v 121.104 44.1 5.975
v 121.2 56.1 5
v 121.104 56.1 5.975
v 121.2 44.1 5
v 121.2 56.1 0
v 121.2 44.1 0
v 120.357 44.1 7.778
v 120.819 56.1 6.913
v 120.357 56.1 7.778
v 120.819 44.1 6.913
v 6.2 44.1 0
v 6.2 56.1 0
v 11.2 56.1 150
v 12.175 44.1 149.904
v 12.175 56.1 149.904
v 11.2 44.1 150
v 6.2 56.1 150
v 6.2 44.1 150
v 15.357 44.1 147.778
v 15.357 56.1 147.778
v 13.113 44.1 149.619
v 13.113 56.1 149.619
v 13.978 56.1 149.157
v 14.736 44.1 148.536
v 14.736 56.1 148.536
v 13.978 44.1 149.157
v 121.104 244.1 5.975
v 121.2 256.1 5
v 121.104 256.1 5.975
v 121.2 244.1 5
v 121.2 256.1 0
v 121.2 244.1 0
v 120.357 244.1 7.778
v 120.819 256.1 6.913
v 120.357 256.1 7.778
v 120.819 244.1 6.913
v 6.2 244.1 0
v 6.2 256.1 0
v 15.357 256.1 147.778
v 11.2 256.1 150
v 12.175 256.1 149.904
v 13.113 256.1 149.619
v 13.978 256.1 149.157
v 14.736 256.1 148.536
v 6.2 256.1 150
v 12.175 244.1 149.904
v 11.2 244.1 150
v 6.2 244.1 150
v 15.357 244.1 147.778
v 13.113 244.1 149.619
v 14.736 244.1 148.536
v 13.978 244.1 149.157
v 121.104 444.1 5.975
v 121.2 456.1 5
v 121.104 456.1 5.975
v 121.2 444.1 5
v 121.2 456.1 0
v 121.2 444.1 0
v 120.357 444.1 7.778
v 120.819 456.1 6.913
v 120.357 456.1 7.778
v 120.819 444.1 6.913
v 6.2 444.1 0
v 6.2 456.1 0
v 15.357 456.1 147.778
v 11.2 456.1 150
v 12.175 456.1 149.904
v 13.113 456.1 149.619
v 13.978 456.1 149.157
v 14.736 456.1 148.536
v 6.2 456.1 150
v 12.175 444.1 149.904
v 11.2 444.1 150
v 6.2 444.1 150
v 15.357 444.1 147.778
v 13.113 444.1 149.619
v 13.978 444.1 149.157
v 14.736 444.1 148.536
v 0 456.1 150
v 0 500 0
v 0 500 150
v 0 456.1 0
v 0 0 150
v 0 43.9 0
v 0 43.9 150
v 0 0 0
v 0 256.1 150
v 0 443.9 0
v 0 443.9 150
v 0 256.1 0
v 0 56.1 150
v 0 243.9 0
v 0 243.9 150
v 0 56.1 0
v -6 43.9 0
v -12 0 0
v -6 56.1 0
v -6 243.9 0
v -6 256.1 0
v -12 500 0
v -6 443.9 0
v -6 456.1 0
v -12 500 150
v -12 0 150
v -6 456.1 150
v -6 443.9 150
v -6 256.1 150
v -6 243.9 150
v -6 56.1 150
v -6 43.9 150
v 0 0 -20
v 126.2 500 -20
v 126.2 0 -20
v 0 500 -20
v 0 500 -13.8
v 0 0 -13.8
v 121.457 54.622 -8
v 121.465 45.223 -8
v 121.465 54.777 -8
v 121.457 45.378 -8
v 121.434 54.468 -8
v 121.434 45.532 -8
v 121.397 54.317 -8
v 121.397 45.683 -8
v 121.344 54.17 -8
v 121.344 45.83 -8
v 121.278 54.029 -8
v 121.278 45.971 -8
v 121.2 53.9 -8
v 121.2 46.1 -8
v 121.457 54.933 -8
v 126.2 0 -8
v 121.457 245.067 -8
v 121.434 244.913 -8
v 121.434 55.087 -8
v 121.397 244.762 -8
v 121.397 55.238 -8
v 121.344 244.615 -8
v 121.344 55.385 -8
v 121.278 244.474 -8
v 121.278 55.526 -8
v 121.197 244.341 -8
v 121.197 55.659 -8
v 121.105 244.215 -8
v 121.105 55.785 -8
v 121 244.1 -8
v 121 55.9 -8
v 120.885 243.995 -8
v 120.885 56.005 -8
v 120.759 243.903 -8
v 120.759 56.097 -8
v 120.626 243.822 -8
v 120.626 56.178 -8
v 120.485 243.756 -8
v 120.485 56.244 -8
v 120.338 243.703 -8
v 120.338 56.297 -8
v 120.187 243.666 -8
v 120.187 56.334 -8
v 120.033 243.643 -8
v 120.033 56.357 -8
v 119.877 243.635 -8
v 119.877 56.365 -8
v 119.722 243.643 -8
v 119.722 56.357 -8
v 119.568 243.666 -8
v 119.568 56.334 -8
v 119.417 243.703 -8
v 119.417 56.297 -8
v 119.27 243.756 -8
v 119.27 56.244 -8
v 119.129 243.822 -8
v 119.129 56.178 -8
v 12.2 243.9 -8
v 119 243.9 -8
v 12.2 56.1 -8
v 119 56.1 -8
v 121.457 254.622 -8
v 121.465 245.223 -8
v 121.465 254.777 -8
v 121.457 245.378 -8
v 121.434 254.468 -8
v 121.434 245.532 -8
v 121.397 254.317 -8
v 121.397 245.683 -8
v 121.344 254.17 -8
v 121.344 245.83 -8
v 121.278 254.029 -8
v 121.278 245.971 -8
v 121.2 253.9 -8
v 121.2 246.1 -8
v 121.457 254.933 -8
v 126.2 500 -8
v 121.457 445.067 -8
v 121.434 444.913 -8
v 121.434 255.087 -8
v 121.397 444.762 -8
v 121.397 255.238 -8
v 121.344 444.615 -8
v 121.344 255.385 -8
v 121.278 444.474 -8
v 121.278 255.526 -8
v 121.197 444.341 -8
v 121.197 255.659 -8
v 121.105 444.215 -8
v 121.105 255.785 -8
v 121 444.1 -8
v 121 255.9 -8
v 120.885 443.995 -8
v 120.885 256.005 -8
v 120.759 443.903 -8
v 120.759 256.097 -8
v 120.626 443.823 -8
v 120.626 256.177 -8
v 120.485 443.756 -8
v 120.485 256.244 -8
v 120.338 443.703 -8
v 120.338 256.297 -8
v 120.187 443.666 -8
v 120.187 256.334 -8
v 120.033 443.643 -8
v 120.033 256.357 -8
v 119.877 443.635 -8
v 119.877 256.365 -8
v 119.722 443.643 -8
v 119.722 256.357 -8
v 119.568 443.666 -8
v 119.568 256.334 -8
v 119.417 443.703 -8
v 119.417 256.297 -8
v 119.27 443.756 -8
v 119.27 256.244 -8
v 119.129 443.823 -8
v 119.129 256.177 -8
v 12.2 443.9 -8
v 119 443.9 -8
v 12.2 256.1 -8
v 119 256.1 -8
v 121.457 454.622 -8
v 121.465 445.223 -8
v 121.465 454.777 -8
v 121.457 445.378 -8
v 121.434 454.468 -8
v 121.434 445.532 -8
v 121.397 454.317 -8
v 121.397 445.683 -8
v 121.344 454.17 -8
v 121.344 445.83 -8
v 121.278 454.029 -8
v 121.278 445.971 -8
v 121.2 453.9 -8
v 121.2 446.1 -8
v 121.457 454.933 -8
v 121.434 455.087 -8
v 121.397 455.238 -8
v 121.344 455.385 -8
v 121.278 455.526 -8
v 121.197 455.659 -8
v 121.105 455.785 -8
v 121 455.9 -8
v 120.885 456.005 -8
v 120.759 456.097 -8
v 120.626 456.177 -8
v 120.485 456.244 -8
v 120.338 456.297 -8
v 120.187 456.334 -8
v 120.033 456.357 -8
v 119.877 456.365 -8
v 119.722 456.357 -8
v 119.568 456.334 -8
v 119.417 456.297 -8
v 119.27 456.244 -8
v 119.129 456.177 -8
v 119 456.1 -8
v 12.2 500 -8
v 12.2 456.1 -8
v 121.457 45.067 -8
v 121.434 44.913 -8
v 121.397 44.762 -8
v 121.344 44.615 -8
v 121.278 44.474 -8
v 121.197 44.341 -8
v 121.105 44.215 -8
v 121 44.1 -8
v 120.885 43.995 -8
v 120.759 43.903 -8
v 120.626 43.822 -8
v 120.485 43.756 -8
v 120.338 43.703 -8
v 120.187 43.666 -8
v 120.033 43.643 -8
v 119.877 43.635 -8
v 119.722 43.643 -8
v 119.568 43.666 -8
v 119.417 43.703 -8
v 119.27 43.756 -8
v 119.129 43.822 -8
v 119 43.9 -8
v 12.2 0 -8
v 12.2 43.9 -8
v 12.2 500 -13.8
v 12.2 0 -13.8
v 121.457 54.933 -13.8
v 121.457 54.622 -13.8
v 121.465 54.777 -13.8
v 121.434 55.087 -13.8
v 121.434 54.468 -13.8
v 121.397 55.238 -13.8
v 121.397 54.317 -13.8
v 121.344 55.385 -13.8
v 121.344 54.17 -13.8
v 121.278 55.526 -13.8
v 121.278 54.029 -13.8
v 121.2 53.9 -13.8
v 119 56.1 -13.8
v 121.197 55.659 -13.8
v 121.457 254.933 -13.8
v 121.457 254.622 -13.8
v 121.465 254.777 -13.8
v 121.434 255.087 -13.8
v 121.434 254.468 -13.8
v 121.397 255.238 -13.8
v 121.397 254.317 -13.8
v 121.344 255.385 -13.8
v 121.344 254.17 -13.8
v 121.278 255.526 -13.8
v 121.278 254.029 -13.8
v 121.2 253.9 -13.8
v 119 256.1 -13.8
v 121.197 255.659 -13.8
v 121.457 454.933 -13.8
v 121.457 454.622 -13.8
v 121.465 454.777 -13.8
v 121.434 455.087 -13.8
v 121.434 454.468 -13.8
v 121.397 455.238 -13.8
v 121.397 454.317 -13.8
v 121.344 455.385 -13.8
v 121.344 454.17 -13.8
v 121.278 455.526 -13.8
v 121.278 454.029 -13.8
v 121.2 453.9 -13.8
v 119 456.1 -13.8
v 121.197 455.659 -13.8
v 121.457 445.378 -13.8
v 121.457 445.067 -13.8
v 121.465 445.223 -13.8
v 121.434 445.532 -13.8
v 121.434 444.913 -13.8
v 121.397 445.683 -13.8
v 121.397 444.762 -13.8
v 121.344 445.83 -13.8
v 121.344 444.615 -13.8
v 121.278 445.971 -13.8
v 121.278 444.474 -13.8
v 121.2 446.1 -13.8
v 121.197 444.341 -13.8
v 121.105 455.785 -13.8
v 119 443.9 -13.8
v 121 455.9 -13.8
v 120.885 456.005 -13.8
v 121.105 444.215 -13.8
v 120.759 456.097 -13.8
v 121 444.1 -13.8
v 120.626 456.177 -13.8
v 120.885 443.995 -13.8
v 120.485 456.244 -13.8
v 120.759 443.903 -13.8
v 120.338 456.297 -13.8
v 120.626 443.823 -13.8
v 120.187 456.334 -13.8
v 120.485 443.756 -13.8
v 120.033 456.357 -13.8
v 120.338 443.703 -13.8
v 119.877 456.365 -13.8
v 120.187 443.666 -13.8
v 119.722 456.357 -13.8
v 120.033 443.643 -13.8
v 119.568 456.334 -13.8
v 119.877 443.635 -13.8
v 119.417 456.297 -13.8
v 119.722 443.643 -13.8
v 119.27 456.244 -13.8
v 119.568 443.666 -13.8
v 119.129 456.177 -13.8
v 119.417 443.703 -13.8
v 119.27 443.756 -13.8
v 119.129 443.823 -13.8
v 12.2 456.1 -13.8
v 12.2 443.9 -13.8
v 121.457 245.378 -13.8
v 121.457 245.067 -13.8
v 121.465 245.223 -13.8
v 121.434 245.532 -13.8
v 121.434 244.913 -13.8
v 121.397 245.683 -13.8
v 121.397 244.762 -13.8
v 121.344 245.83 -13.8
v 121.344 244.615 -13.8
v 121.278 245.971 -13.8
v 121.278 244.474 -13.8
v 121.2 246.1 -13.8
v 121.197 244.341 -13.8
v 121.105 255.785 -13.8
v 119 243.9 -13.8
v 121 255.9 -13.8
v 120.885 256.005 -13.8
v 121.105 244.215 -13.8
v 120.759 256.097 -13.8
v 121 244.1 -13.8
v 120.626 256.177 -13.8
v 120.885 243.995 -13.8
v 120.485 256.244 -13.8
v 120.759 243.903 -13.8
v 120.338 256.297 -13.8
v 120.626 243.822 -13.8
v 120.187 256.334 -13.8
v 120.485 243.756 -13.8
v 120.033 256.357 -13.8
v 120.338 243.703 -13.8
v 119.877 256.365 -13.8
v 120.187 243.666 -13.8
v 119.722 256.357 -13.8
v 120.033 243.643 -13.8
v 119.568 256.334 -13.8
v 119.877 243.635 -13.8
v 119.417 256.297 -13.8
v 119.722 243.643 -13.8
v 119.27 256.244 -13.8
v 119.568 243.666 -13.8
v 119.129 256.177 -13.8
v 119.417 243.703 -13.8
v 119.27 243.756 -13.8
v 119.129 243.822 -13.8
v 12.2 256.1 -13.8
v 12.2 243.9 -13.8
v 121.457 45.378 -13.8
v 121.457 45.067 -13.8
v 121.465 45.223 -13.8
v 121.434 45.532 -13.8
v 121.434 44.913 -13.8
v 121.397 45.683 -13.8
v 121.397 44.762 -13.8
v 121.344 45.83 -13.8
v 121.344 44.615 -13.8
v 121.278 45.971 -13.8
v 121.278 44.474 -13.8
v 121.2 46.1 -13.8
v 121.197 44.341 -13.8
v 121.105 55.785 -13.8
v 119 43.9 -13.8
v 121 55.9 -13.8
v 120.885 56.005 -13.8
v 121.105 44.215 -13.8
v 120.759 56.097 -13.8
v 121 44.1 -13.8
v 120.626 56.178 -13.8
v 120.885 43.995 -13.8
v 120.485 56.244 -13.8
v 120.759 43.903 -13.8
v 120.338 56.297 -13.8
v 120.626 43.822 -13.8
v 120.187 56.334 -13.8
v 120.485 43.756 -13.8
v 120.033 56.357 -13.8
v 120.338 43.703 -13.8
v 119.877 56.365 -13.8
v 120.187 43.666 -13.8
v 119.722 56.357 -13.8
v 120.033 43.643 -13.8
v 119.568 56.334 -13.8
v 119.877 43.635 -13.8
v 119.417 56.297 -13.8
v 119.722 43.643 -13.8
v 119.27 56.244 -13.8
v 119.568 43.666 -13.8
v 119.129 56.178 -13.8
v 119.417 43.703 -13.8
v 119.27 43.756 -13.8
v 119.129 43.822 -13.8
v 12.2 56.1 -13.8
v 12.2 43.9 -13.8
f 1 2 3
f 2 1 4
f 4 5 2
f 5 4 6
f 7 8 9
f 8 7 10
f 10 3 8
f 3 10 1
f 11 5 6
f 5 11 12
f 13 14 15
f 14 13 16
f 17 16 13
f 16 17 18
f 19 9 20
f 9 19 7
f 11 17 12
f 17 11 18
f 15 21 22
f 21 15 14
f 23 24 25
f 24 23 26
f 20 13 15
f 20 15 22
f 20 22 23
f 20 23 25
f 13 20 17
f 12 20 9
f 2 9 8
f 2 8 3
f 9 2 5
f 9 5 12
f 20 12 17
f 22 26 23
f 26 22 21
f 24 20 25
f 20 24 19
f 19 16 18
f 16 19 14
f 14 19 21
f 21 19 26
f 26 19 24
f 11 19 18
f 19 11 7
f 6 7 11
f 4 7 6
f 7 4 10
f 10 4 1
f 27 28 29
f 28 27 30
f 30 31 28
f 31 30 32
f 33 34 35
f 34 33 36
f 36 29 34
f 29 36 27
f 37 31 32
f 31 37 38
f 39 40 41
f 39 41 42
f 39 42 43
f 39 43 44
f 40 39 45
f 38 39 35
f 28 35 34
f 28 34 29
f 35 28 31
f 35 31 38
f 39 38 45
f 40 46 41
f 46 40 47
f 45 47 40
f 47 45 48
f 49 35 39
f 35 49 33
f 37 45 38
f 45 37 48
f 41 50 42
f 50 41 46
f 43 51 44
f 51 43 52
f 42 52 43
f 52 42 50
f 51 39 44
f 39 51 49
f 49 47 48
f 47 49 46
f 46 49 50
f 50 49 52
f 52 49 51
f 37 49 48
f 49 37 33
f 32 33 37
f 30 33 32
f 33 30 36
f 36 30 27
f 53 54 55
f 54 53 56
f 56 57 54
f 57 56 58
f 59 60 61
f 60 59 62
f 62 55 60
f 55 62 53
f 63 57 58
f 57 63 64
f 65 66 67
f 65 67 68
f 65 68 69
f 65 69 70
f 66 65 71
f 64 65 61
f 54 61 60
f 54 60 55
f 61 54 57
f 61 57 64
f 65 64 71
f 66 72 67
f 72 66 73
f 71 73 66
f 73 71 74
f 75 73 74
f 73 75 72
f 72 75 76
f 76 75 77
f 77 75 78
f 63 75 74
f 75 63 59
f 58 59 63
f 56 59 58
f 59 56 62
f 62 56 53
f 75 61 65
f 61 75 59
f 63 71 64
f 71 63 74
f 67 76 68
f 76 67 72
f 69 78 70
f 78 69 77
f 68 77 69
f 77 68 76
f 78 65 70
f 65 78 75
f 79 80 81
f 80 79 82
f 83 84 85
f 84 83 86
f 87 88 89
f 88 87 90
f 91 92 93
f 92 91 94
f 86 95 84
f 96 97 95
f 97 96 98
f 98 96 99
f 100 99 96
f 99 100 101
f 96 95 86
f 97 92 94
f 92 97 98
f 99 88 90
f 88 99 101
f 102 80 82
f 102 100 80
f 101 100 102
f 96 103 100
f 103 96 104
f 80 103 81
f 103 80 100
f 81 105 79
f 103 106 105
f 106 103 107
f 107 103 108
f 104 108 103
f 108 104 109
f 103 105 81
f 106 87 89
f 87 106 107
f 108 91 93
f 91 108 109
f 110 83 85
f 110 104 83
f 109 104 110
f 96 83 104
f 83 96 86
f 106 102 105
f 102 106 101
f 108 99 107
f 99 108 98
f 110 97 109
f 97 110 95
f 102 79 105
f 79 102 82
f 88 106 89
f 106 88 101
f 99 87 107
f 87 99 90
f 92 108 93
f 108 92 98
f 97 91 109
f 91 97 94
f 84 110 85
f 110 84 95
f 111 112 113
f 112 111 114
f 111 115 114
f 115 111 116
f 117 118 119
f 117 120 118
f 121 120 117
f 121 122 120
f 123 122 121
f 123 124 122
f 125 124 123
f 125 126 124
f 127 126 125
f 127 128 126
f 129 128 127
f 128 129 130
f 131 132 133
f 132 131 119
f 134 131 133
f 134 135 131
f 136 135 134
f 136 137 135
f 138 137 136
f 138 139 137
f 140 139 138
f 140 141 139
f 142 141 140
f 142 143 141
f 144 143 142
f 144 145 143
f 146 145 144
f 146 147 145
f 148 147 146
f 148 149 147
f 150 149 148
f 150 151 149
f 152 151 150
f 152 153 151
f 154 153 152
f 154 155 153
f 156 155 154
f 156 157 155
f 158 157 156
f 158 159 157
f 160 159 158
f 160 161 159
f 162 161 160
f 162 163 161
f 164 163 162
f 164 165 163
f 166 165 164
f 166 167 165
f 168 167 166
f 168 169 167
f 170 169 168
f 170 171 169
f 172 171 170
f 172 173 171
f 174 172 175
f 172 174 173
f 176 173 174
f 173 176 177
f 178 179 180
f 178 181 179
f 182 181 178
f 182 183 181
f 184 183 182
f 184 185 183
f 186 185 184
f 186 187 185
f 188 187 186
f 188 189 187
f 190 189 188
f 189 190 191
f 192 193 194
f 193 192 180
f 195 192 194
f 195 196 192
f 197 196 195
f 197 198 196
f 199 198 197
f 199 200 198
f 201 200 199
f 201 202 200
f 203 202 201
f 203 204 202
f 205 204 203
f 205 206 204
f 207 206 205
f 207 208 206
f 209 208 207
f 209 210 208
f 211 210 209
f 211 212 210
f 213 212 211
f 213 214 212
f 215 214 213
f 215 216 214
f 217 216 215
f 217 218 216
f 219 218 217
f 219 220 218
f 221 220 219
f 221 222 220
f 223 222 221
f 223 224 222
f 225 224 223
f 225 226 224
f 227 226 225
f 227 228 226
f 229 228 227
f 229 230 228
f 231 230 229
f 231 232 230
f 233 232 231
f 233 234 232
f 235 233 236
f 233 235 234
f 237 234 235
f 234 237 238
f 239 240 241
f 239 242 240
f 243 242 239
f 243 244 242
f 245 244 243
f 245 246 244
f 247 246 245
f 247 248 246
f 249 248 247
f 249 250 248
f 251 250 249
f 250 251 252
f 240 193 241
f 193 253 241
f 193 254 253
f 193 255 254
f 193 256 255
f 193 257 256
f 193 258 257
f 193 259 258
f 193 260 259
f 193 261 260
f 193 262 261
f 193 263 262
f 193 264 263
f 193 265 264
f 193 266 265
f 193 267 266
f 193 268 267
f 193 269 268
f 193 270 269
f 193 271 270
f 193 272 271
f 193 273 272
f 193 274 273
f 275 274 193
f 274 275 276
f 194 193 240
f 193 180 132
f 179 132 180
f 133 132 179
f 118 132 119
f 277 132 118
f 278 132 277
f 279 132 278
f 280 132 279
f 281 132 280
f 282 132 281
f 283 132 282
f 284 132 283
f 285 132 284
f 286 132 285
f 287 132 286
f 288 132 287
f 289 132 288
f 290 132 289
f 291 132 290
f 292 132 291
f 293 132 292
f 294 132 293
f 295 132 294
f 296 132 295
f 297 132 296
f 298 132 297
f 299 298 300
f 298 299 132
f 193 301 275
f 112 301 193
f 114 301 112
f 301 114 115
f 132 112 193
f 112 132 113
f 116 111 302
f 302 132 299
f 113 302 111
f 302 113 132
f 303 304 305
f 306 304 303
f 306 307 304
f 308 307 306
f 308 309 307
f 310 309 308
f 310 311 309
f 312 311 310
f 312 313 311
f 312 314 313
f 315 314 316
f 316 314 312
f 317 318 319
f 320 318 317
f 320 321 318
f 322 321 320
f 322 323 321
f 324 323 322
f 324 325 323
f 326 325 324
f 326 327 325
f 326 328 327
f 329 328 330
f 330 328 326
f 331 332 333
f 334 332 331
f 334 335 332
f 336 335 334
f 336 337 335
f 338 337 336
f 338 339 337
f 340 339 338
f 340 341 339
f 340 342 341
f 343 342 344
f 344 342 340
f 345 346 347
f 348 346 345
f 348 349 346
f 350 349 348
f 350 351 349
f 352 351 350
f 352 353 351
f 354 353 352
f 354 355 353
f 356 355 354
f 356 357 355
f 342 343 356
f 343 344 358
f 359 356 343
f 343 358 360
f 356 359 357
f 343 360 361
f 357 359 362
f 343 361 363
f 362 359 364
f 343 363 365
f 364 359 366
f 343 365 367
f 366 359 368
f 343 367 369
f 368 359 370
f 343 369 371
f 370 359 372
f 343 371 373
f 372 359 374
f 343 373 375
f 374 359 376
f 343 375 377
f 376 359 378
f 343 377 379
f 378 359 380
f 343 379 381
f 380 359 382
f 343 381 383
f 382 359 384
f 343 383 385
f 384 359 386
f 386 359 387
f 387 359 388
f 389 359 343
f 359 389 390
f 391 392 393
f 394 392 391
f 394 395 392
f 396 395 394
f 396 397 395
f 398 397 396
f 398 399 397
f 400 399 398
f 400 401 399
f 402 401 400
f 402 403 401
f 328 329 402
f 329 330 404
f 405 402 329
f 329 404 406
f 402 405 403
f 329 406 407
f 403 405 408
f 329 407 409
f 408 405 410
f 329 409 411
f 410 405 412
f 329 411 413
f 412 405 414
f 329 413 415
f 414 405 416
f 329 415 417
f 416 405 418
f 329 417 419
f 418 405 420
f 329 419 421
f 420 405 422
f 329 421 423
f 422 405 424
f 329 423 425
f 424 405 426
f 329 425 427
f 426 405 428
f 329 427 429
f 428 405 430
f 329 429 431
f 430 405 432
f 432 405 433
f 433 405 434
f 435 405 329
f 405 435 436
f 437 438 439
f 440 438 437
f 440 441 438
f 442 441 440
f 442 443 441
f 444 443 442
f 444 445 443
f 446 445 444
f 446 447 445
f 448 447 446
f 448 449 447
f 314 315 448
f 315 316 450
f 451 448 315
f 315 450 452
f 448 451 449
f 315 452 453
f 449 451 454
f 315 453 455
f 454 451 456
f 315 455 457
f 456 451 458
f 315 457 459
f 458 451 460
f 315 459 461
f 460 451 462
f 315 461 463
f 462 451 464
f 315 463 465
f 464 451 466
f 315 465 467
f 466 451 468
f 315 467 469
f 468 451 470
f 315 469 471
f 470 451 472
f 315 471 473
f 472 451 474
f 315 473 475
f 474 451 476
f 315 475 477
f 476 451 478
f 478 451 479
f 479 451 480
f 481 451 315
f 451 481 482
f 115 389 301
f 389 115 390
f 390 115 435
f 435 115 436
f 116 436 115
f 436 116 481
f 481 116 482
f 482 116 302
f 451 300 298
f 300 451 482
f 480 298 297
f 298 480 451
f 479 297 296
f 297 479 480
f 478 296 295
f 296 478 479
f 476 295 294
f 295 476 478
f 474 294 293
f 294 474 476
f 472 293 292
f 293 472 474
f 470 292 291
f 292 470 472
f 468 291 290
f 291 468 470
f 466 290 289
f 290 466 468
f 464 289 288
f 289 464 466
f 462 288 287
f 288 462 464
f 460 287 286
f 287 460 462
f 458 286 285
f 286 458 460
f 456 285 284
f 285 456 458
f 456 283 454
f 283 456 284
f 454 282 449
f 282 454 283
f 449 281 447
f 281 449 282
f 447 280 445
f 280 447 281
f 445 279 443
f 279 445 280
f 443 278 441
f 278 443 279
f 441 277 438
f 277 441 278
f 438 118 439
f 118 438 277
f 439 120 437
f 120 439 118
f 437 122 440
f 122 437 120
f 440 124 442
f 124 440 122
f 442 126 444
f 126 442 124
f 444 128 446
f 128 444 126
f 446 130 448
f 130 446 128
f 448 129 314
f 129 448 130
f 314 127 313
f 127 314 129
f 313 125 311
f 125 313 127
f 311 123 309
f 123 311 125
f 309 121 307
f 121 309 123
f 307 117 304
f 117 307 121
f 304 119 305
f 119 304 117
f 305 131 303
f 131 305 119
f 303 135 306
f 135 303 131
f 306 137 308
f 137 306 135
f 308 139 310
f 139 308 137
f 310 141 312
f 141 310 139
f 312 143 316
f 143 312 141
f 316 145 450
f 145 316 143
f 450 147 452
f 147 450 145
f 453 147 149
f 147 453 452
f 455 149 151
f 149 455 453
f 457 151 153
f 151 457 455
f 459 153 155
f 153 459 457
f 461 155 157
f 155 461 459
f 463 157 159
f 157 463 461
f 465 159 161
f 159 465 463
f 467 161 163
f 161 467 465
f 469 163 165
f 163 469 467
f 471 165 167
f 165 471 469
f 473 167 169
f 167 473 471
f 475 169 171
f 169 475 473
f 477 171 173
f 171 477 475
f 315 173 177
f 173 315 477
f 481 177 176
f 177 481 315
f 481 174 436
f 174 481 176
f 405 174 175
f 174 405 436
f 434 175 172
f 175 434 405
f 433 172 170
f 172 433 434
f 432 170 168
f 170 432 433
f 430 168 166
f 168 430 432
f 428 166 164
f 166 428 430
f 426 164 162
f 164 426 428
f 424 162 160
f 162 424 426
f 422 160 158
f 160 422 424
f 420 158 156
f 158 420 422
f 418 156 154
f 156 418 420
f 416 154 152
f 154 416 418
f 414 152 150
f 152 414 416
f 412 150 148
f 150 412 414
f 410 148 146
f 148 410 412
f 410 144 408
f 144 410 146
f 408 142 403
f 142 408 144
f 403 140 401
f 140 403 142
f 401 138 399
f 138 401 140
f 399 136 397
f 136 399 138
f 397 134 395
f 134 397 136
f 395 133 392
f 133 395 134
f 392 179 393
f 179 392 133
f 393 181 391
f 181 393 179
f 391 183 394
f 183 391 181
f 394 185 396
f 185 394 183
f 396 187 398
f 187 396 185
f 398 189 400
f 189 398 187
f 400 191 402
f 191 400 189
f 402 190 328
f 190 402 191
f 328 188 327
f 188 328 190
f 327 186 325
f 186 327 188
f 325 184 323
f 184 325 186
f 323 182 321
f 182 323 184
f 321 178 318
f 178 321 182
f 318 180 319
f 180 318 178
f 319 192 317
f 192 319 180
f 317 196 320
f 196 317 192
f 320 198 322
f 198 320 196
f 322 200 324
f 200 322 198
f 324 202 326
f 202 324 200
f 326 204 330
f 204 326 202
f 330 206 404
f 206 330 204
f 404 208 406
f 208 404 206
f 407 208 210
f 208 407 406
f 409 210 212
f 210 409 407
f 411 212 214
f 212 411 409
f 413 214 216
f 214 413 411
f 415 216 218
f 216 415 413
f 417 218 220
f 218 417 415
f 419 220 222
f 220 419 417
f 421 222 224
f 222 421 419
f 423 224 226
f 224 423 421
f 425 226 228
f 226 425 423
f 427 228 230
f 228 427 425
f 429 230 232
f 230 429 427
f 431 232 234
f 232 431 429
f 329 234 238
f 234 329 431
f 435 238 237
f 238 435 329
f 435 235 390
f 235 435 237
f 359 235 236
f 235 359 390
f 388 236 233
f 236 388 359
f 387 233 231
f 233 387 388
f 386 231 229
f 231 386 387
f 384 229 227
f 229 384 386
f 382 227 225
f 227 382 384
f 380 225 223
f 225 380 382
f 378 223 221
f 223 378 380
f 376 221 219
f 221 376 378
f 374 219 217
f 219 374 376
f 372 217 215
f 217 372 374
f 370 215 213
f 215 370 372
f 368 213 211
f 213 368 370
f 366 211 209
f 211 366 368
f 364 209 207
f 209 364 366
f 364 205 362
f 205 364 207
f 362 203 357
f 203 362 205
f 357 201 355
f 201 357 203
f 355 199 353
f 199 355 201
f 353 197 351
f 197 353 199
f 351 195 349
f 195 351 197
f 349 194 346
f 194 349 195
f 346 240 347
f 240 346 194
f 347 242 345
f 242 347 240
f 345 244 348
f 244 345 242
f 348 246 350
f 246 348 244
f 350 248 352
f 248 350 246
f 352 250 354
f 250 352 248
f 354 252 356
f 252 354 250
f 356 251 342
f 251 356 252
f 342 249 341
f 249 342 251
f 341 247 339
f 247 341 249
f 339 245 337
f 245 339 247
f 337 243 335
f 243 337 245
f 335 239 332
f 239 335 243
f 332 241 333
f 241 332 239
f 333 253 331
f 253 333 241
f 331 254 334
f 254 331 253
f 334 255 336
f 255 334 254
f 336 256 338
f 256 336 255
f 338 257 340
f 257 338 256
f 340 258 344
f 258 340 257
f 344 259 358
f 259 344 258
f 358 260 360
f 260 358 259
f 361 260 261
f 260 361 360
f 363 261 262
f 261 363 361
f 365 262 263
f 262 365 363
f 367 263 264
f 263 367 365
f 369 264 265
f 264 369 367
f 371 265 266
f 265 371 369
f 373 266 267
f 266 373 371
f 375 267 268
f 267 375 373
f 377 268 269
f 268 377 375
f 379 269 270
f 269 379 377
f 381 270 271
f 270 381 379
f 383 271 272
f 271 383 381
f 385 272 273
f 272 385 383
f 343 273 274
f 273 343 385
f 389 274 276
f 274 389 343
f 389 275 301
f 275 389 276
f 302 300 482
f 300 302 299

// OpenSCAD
// file: ../../_lib/fillets.scad
module SpikeBox(dims, cutter_dia, center=false, compression_mm=0.4) {
  // This is intentionally tighter than just doing the math; wood compresses.
  // The direction of compression_mm is from each edge, NOT a diagonal.
  // Really it's just a fudge factor.
  off = (sqrt(2) * cutter_dia / 4) + compression_mm;
  translate(center ? [0,0] : [dims[0]/2,dims[1]/2]) {
    hull() for(x_scale=[1,-1], y_scale=[1,-1]) scale([x_scale,y_scale])
      translate([dims[0]/2-off,dims[1]/2-off])
      polygon(points=[[0,0], [off,0], [0,off]], convexity=2);
    // To debug corner intersection...
    // # square(dims, center=true);
    for(x_scale=[1,-1], y_scale=[1,-1]) scale([x_scale,y_scale])
      translate([dims[0]/2-off, dims[1]/2-off])
      circle(d=cutter_dia,$fn=64);
  }
}
// file: fence_lib.scad
include <../../_lib/fillets.scad>;

gMaterialThick = 12.2;
gCutDepth = -(gMaterialThick+0.2);
gBitSize = 3.175;
gRealBitSize = gBitSize;

// 500 250 100
gSledLength = 500;
gSledA = 150;
gSledB = 120;
// 100 400
gRabbetPositions = [50, gSledLength/2, gSledLength-50];
gPocketDepth = 6;

module Angle(r=5, inset=5) {
  $fn=32;
  hull() {
    for(p=[[r,r],[r,gSledA-r],[gSledB-r-inset,r]])
      translate(p) circle(r=r);
    for(p=[[0,0],[0,gSledA-1],[gSledB-1-inset,0]])
      translate(p) square([1,1]);
  }

}

module Side() {
  square([gSledA,gSledLength]);
}

module SideRabbets(rabbet_width, rabbet_positions) {
  for(p=rabbet_positions)
    translate([-gBitSize,p-rabbet_width/2])
    SpikeBox([gSledA+gBitSize*2,rabbet_width],gBitSize);
}

module Bottom() {
  square([gSledB+gMaterialThick-gPocketDepth,gSledLength]);
}

module BottomRabbets(rabbet_width, rabbet_positions) {
  for(p=rabbet_positions)
    translate([gMaterialThick-gPocketDepth,p-rabbet_width/2])
    SpikeBox([gSledB-5,rabbet_width],gBitSize);
  translate([-1,-gBitSize/2]) square([rabbet_width+1,gSledLength+gBitSize]);
}
// main file
include <fence_lib.scad>;

for(y=gRabbetPositions) translate([(gMaterialThick-gPocketDepth),y+gMaterialThick/2,0])
  rotate([90,0,0]) linear_extrude(height=12) Angle();
// TODO translate for rabbet
//translate([gPocketDepth-1,0,0])
rotate([0,-90,0]) difference() {
  linear_extrude(height=12) Side();
  translate([0,0,-gPocketDepth])
    linear_extrude(height=12) SideRabbets(gMaterialThick, gRabbetPositions);
}

translate([0,0,-20])
difference() {
  linear_extrude(height=12) Bottom();
  translate([0,0,gMaterialThick-gPocketDepth])
    linear_extrude(height=12) BottomRabbets(gMaterialThick, gRabbetPositions);
}
